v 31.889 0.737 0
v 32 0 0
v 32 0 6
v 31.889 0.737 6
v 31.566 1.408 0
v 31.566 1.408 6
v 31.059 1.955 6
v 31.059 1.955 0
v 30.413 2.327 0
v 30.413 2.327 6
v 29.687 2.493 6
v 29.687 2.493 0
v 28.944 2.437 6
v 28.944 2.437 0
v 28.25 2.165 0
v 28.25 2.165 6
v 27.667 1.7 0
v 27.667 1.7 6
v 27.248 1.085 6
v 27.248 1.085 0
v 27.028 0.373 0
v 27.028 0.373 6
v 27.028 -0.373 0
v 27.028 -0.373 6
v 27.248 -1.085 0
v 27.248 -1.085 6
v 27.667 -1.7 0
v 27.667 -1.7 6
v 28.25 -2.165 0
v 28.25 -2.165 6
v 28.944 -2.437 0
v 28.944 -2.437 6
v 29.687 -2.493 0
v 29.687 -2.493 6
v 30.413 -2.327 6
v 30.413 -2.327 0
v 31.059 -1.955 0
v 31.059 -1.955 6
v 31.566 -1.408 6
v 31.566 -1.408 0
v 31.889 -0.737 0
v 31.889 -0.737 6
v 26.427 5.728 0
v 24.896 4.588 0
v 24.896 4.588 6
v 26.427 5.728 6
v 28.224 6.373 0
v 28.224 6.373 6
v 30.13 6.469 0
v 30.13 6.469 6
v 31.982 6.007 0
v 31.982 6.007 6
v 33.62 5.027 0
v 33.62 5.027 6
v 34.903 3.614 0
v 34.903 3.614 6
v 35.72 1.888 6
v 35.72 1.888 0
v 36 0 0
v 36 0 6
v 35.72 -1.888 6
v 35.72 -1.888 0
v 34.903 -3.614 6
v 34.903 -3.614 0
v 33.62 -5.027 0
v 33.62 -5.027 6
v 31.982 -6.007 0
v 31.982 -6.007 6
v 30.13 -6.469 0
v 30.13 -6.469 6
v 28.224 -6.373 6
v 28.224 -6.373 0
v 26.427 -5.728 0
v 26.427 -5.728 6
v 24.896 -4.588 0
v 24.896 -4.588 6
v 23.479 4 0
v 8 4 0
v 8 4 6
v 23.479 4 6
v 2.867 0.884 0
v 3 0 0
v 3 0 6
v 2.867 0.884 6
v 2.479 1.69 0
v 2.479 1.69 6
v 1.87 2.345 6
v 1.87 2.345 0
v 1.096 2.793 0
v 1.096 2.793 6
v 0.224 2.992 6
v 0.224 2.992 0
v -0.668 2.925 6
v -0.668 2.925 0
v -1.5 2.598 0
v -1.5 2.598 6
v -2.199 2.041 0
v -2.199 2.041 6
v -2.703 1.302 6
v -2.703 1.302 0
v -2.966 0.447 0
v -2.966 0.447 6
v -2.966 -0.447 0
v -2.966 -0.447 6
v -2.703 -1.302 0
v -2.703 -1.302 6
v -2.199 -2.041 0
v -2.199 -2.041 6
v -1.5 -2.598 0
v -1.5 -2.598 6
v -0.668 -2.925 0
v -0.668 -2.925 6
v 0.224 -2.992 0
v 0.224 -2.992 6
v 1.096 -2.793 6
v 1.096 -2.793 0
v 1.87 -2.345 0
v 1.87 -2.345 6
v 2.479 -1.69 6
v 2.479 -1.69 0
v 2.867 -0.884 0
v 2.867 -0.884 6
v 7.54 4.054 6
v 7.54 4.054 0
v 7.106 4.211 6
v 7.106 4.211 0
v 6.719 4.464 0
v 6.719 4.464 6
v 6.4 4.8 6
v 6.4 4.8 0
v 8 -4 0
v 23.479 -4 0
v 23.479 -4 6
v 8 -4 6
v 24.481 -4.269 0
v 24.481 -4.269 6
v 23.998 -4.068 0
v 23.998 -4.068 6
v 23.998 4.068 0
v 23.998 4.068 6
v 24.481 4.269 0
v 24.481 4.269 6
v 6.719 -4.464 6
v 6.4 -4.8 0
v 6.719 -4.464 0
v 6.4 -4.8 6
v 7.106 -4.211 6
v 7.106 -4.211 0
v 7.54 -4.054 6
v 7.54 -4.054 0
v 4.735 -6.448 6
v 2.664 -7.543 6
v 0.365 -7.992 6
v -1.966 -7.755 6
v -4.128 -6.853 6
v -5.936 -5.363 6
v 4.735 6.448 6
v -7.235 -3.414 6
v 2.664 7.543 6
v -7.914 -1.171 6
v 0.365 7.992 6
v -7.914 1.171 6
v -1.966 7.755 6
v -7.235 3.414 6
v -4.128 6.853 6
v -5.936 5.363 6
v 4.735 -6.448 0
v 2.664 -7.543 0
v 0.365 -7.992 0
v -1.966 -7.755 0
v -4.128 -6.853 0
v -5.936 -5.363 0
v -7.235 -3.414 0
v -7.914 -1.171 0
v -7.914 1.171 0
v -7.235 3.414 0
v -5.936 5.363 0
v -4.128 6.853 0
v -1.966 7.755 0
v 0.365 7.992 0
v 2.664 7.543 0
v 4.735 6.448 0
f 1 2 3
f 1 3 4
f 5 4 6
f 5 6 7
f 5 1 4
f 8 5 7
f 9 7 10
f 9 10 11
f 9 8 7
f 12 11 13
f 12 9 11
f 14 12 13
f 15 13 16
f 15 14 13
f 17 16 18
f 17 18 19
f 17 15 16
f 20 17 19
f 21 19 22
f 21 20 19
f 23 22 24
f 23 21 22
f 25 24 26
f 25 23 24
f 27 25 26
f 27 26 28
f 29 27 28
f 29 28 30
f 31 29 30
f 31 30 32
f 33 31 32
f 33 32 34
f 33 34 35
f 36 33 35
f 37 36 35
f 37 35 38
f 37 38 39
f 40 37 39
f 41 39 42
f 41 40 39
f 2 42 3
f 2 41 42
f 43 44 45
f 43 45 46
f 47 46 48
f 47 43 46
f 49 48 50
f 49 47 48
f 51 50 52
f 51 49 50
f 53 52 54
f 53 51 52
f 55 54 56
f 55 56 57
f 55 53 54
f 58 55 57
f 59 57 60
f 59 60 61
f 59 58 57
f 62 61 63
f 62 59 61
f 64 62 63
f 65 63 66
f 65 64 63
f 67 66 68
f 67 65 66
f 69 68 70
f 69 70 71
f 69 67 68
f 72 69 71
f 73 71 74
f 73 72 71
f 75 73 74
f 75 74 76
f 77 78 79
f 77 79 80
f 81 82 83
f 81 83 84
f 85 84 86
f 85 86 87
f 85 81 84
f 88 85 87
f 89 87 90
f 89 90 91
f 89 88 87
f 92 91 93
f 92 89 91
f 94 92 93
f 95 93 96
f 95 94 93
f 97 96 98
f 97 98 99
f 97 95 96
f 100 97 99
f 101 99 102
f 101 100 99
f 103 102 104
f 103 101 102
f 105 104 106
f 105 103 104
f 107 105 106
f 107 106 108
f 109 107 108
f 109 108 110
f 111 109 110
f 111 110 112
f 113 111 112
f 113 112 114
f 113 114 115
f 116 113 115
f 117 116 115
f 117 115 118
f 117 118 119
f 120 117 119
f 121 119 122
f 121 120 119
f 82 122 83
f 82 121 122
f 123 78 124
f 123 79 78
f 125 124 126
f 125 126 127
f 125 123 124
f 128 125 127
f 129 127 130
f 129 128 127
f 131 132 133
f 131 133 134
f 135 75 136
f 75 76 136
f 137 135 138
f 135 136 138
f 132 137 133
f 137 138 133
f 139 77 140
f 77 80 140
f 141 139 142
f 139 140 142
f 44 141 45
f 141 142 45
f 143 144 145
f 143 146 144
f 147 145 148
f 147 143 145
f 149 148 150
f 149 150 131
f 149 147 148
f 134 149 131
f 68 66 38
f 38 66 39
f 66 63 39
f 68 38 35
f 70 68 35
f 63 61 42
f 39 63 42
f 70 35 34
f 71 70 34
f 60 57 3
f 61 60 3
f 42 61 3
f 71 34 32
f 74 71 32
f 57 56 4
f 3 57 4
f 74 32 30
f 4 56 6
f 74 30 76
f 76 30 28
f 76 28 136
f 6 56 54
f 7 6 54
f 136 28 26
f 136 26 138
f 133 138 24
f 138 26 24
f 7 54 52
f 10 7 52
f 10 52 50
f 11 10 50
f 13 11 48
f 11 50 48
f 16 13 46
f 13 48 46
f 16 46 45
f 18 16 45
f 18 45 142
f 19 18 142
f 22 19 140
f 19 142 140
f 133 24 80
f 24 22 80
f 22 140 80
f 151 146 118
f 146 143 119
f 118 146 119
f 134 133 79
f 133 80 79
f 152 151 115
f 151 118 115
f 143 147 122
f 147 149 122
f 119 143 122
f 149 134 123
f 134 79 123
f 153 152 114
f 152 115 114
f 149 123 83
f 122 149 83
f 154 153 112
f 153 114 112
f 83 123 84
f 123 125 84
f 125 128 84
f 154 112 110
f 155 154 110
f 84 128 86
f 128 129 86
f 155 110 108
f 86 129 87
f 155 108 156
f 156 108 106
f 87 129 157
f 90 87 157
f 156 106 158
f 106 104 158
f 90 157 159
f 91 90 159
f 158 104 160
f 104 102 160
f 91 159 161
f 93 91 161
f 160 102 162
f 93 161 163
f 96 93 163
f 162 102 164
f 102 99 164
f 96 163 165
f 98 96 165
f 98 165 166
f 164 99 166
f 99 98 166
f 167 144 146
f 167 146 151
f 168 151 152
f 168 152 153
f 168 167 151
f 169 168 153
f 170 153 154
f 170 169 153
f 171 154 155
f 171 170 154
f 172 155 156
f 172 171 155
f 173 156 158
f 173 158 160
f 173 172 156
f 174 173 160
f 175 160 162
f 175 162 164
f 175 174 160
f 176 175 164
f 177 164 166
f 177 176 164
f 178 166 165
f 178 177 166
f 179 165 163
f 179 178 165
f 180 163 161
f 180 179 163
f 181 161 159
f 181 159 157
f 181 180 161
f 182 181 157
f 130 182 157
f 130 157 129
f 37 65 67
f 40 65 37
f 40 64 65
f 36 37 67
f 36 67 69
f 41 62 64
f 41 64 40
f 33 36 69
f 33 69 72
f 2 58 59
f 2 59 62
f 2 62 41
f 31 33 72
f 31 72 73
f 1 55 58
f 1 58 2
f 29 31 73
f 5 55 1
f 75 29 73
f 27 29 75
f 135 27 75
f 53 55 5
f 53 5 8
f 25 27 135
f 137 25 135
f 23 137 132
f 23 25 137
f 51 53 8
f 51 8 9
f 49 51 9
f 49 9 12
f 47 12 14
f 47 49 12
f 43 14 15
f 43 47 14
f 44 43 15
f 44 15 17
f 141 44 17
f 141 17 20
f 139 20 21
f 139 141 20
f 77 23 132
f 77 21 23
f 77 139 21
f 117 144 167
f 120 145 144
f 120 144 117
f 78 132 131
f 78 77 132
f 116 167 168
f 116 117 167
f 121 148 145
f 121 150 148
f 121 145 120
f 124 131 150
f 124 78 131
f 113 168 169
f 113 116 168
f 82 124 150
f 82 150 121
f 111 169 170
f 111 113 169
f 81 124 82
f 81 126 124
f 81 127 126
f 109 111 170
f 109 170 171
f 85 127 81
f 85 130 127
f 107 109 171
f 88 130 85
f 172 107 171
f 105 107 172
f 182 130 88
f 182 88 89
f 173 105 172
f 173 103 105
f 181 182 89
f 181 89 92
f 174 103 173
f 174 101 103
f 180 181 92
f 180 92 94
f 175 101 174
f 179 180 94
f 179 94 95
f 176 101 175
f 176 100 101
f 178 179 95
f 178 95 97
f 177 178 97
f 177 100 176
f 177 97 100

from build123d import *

# Parameters (mm, degrees)
ESQUISSE1_R        = 3
ESQUISSE1_R_2      = 2.5
BOSS_EXTRU_1_DEPTH = 6
CONG_1_R           = 2


with BuildPart() as part:
    # Esquisse1 → Boss.-Extru.1 (new body)
    with BuildSketch(Plane.XY):
        with BuildLine():
            Line((6.92820323, 4), (24.376524617, 4))
            ThreePointArc((24.376524617, 4), (36, 0), (24.376524617, -4))
            Line((24.376524617, -4), (6.92820323, -4))
            ThreePointArc((6.92820323, -4), (-8, 0), (6.92820323, 4))
        make_face()
        Circle(ESQUISSE1_R, mode=Mode.SUBTRACT)
        with Locations((29.5, 0)):
            Circle(ESQUISSE1_R_2, mode=Mode.SUBTRACT)
    extrude(amount=BOSS_EXTRU_1_DEPTH)

    # Congé1
    cong_1_edges = [part.edges().sort_by_distance(p)[0] for p in [
        (6.92820323, 4, 3),
        (24.376524617, 4, 3),
        (24.376524617, -4, 3),
        (6.92820323, -4, 3),
    ]]
    fillet(cong_1_edges, radius=CONG_1_R)


solid = part.part
